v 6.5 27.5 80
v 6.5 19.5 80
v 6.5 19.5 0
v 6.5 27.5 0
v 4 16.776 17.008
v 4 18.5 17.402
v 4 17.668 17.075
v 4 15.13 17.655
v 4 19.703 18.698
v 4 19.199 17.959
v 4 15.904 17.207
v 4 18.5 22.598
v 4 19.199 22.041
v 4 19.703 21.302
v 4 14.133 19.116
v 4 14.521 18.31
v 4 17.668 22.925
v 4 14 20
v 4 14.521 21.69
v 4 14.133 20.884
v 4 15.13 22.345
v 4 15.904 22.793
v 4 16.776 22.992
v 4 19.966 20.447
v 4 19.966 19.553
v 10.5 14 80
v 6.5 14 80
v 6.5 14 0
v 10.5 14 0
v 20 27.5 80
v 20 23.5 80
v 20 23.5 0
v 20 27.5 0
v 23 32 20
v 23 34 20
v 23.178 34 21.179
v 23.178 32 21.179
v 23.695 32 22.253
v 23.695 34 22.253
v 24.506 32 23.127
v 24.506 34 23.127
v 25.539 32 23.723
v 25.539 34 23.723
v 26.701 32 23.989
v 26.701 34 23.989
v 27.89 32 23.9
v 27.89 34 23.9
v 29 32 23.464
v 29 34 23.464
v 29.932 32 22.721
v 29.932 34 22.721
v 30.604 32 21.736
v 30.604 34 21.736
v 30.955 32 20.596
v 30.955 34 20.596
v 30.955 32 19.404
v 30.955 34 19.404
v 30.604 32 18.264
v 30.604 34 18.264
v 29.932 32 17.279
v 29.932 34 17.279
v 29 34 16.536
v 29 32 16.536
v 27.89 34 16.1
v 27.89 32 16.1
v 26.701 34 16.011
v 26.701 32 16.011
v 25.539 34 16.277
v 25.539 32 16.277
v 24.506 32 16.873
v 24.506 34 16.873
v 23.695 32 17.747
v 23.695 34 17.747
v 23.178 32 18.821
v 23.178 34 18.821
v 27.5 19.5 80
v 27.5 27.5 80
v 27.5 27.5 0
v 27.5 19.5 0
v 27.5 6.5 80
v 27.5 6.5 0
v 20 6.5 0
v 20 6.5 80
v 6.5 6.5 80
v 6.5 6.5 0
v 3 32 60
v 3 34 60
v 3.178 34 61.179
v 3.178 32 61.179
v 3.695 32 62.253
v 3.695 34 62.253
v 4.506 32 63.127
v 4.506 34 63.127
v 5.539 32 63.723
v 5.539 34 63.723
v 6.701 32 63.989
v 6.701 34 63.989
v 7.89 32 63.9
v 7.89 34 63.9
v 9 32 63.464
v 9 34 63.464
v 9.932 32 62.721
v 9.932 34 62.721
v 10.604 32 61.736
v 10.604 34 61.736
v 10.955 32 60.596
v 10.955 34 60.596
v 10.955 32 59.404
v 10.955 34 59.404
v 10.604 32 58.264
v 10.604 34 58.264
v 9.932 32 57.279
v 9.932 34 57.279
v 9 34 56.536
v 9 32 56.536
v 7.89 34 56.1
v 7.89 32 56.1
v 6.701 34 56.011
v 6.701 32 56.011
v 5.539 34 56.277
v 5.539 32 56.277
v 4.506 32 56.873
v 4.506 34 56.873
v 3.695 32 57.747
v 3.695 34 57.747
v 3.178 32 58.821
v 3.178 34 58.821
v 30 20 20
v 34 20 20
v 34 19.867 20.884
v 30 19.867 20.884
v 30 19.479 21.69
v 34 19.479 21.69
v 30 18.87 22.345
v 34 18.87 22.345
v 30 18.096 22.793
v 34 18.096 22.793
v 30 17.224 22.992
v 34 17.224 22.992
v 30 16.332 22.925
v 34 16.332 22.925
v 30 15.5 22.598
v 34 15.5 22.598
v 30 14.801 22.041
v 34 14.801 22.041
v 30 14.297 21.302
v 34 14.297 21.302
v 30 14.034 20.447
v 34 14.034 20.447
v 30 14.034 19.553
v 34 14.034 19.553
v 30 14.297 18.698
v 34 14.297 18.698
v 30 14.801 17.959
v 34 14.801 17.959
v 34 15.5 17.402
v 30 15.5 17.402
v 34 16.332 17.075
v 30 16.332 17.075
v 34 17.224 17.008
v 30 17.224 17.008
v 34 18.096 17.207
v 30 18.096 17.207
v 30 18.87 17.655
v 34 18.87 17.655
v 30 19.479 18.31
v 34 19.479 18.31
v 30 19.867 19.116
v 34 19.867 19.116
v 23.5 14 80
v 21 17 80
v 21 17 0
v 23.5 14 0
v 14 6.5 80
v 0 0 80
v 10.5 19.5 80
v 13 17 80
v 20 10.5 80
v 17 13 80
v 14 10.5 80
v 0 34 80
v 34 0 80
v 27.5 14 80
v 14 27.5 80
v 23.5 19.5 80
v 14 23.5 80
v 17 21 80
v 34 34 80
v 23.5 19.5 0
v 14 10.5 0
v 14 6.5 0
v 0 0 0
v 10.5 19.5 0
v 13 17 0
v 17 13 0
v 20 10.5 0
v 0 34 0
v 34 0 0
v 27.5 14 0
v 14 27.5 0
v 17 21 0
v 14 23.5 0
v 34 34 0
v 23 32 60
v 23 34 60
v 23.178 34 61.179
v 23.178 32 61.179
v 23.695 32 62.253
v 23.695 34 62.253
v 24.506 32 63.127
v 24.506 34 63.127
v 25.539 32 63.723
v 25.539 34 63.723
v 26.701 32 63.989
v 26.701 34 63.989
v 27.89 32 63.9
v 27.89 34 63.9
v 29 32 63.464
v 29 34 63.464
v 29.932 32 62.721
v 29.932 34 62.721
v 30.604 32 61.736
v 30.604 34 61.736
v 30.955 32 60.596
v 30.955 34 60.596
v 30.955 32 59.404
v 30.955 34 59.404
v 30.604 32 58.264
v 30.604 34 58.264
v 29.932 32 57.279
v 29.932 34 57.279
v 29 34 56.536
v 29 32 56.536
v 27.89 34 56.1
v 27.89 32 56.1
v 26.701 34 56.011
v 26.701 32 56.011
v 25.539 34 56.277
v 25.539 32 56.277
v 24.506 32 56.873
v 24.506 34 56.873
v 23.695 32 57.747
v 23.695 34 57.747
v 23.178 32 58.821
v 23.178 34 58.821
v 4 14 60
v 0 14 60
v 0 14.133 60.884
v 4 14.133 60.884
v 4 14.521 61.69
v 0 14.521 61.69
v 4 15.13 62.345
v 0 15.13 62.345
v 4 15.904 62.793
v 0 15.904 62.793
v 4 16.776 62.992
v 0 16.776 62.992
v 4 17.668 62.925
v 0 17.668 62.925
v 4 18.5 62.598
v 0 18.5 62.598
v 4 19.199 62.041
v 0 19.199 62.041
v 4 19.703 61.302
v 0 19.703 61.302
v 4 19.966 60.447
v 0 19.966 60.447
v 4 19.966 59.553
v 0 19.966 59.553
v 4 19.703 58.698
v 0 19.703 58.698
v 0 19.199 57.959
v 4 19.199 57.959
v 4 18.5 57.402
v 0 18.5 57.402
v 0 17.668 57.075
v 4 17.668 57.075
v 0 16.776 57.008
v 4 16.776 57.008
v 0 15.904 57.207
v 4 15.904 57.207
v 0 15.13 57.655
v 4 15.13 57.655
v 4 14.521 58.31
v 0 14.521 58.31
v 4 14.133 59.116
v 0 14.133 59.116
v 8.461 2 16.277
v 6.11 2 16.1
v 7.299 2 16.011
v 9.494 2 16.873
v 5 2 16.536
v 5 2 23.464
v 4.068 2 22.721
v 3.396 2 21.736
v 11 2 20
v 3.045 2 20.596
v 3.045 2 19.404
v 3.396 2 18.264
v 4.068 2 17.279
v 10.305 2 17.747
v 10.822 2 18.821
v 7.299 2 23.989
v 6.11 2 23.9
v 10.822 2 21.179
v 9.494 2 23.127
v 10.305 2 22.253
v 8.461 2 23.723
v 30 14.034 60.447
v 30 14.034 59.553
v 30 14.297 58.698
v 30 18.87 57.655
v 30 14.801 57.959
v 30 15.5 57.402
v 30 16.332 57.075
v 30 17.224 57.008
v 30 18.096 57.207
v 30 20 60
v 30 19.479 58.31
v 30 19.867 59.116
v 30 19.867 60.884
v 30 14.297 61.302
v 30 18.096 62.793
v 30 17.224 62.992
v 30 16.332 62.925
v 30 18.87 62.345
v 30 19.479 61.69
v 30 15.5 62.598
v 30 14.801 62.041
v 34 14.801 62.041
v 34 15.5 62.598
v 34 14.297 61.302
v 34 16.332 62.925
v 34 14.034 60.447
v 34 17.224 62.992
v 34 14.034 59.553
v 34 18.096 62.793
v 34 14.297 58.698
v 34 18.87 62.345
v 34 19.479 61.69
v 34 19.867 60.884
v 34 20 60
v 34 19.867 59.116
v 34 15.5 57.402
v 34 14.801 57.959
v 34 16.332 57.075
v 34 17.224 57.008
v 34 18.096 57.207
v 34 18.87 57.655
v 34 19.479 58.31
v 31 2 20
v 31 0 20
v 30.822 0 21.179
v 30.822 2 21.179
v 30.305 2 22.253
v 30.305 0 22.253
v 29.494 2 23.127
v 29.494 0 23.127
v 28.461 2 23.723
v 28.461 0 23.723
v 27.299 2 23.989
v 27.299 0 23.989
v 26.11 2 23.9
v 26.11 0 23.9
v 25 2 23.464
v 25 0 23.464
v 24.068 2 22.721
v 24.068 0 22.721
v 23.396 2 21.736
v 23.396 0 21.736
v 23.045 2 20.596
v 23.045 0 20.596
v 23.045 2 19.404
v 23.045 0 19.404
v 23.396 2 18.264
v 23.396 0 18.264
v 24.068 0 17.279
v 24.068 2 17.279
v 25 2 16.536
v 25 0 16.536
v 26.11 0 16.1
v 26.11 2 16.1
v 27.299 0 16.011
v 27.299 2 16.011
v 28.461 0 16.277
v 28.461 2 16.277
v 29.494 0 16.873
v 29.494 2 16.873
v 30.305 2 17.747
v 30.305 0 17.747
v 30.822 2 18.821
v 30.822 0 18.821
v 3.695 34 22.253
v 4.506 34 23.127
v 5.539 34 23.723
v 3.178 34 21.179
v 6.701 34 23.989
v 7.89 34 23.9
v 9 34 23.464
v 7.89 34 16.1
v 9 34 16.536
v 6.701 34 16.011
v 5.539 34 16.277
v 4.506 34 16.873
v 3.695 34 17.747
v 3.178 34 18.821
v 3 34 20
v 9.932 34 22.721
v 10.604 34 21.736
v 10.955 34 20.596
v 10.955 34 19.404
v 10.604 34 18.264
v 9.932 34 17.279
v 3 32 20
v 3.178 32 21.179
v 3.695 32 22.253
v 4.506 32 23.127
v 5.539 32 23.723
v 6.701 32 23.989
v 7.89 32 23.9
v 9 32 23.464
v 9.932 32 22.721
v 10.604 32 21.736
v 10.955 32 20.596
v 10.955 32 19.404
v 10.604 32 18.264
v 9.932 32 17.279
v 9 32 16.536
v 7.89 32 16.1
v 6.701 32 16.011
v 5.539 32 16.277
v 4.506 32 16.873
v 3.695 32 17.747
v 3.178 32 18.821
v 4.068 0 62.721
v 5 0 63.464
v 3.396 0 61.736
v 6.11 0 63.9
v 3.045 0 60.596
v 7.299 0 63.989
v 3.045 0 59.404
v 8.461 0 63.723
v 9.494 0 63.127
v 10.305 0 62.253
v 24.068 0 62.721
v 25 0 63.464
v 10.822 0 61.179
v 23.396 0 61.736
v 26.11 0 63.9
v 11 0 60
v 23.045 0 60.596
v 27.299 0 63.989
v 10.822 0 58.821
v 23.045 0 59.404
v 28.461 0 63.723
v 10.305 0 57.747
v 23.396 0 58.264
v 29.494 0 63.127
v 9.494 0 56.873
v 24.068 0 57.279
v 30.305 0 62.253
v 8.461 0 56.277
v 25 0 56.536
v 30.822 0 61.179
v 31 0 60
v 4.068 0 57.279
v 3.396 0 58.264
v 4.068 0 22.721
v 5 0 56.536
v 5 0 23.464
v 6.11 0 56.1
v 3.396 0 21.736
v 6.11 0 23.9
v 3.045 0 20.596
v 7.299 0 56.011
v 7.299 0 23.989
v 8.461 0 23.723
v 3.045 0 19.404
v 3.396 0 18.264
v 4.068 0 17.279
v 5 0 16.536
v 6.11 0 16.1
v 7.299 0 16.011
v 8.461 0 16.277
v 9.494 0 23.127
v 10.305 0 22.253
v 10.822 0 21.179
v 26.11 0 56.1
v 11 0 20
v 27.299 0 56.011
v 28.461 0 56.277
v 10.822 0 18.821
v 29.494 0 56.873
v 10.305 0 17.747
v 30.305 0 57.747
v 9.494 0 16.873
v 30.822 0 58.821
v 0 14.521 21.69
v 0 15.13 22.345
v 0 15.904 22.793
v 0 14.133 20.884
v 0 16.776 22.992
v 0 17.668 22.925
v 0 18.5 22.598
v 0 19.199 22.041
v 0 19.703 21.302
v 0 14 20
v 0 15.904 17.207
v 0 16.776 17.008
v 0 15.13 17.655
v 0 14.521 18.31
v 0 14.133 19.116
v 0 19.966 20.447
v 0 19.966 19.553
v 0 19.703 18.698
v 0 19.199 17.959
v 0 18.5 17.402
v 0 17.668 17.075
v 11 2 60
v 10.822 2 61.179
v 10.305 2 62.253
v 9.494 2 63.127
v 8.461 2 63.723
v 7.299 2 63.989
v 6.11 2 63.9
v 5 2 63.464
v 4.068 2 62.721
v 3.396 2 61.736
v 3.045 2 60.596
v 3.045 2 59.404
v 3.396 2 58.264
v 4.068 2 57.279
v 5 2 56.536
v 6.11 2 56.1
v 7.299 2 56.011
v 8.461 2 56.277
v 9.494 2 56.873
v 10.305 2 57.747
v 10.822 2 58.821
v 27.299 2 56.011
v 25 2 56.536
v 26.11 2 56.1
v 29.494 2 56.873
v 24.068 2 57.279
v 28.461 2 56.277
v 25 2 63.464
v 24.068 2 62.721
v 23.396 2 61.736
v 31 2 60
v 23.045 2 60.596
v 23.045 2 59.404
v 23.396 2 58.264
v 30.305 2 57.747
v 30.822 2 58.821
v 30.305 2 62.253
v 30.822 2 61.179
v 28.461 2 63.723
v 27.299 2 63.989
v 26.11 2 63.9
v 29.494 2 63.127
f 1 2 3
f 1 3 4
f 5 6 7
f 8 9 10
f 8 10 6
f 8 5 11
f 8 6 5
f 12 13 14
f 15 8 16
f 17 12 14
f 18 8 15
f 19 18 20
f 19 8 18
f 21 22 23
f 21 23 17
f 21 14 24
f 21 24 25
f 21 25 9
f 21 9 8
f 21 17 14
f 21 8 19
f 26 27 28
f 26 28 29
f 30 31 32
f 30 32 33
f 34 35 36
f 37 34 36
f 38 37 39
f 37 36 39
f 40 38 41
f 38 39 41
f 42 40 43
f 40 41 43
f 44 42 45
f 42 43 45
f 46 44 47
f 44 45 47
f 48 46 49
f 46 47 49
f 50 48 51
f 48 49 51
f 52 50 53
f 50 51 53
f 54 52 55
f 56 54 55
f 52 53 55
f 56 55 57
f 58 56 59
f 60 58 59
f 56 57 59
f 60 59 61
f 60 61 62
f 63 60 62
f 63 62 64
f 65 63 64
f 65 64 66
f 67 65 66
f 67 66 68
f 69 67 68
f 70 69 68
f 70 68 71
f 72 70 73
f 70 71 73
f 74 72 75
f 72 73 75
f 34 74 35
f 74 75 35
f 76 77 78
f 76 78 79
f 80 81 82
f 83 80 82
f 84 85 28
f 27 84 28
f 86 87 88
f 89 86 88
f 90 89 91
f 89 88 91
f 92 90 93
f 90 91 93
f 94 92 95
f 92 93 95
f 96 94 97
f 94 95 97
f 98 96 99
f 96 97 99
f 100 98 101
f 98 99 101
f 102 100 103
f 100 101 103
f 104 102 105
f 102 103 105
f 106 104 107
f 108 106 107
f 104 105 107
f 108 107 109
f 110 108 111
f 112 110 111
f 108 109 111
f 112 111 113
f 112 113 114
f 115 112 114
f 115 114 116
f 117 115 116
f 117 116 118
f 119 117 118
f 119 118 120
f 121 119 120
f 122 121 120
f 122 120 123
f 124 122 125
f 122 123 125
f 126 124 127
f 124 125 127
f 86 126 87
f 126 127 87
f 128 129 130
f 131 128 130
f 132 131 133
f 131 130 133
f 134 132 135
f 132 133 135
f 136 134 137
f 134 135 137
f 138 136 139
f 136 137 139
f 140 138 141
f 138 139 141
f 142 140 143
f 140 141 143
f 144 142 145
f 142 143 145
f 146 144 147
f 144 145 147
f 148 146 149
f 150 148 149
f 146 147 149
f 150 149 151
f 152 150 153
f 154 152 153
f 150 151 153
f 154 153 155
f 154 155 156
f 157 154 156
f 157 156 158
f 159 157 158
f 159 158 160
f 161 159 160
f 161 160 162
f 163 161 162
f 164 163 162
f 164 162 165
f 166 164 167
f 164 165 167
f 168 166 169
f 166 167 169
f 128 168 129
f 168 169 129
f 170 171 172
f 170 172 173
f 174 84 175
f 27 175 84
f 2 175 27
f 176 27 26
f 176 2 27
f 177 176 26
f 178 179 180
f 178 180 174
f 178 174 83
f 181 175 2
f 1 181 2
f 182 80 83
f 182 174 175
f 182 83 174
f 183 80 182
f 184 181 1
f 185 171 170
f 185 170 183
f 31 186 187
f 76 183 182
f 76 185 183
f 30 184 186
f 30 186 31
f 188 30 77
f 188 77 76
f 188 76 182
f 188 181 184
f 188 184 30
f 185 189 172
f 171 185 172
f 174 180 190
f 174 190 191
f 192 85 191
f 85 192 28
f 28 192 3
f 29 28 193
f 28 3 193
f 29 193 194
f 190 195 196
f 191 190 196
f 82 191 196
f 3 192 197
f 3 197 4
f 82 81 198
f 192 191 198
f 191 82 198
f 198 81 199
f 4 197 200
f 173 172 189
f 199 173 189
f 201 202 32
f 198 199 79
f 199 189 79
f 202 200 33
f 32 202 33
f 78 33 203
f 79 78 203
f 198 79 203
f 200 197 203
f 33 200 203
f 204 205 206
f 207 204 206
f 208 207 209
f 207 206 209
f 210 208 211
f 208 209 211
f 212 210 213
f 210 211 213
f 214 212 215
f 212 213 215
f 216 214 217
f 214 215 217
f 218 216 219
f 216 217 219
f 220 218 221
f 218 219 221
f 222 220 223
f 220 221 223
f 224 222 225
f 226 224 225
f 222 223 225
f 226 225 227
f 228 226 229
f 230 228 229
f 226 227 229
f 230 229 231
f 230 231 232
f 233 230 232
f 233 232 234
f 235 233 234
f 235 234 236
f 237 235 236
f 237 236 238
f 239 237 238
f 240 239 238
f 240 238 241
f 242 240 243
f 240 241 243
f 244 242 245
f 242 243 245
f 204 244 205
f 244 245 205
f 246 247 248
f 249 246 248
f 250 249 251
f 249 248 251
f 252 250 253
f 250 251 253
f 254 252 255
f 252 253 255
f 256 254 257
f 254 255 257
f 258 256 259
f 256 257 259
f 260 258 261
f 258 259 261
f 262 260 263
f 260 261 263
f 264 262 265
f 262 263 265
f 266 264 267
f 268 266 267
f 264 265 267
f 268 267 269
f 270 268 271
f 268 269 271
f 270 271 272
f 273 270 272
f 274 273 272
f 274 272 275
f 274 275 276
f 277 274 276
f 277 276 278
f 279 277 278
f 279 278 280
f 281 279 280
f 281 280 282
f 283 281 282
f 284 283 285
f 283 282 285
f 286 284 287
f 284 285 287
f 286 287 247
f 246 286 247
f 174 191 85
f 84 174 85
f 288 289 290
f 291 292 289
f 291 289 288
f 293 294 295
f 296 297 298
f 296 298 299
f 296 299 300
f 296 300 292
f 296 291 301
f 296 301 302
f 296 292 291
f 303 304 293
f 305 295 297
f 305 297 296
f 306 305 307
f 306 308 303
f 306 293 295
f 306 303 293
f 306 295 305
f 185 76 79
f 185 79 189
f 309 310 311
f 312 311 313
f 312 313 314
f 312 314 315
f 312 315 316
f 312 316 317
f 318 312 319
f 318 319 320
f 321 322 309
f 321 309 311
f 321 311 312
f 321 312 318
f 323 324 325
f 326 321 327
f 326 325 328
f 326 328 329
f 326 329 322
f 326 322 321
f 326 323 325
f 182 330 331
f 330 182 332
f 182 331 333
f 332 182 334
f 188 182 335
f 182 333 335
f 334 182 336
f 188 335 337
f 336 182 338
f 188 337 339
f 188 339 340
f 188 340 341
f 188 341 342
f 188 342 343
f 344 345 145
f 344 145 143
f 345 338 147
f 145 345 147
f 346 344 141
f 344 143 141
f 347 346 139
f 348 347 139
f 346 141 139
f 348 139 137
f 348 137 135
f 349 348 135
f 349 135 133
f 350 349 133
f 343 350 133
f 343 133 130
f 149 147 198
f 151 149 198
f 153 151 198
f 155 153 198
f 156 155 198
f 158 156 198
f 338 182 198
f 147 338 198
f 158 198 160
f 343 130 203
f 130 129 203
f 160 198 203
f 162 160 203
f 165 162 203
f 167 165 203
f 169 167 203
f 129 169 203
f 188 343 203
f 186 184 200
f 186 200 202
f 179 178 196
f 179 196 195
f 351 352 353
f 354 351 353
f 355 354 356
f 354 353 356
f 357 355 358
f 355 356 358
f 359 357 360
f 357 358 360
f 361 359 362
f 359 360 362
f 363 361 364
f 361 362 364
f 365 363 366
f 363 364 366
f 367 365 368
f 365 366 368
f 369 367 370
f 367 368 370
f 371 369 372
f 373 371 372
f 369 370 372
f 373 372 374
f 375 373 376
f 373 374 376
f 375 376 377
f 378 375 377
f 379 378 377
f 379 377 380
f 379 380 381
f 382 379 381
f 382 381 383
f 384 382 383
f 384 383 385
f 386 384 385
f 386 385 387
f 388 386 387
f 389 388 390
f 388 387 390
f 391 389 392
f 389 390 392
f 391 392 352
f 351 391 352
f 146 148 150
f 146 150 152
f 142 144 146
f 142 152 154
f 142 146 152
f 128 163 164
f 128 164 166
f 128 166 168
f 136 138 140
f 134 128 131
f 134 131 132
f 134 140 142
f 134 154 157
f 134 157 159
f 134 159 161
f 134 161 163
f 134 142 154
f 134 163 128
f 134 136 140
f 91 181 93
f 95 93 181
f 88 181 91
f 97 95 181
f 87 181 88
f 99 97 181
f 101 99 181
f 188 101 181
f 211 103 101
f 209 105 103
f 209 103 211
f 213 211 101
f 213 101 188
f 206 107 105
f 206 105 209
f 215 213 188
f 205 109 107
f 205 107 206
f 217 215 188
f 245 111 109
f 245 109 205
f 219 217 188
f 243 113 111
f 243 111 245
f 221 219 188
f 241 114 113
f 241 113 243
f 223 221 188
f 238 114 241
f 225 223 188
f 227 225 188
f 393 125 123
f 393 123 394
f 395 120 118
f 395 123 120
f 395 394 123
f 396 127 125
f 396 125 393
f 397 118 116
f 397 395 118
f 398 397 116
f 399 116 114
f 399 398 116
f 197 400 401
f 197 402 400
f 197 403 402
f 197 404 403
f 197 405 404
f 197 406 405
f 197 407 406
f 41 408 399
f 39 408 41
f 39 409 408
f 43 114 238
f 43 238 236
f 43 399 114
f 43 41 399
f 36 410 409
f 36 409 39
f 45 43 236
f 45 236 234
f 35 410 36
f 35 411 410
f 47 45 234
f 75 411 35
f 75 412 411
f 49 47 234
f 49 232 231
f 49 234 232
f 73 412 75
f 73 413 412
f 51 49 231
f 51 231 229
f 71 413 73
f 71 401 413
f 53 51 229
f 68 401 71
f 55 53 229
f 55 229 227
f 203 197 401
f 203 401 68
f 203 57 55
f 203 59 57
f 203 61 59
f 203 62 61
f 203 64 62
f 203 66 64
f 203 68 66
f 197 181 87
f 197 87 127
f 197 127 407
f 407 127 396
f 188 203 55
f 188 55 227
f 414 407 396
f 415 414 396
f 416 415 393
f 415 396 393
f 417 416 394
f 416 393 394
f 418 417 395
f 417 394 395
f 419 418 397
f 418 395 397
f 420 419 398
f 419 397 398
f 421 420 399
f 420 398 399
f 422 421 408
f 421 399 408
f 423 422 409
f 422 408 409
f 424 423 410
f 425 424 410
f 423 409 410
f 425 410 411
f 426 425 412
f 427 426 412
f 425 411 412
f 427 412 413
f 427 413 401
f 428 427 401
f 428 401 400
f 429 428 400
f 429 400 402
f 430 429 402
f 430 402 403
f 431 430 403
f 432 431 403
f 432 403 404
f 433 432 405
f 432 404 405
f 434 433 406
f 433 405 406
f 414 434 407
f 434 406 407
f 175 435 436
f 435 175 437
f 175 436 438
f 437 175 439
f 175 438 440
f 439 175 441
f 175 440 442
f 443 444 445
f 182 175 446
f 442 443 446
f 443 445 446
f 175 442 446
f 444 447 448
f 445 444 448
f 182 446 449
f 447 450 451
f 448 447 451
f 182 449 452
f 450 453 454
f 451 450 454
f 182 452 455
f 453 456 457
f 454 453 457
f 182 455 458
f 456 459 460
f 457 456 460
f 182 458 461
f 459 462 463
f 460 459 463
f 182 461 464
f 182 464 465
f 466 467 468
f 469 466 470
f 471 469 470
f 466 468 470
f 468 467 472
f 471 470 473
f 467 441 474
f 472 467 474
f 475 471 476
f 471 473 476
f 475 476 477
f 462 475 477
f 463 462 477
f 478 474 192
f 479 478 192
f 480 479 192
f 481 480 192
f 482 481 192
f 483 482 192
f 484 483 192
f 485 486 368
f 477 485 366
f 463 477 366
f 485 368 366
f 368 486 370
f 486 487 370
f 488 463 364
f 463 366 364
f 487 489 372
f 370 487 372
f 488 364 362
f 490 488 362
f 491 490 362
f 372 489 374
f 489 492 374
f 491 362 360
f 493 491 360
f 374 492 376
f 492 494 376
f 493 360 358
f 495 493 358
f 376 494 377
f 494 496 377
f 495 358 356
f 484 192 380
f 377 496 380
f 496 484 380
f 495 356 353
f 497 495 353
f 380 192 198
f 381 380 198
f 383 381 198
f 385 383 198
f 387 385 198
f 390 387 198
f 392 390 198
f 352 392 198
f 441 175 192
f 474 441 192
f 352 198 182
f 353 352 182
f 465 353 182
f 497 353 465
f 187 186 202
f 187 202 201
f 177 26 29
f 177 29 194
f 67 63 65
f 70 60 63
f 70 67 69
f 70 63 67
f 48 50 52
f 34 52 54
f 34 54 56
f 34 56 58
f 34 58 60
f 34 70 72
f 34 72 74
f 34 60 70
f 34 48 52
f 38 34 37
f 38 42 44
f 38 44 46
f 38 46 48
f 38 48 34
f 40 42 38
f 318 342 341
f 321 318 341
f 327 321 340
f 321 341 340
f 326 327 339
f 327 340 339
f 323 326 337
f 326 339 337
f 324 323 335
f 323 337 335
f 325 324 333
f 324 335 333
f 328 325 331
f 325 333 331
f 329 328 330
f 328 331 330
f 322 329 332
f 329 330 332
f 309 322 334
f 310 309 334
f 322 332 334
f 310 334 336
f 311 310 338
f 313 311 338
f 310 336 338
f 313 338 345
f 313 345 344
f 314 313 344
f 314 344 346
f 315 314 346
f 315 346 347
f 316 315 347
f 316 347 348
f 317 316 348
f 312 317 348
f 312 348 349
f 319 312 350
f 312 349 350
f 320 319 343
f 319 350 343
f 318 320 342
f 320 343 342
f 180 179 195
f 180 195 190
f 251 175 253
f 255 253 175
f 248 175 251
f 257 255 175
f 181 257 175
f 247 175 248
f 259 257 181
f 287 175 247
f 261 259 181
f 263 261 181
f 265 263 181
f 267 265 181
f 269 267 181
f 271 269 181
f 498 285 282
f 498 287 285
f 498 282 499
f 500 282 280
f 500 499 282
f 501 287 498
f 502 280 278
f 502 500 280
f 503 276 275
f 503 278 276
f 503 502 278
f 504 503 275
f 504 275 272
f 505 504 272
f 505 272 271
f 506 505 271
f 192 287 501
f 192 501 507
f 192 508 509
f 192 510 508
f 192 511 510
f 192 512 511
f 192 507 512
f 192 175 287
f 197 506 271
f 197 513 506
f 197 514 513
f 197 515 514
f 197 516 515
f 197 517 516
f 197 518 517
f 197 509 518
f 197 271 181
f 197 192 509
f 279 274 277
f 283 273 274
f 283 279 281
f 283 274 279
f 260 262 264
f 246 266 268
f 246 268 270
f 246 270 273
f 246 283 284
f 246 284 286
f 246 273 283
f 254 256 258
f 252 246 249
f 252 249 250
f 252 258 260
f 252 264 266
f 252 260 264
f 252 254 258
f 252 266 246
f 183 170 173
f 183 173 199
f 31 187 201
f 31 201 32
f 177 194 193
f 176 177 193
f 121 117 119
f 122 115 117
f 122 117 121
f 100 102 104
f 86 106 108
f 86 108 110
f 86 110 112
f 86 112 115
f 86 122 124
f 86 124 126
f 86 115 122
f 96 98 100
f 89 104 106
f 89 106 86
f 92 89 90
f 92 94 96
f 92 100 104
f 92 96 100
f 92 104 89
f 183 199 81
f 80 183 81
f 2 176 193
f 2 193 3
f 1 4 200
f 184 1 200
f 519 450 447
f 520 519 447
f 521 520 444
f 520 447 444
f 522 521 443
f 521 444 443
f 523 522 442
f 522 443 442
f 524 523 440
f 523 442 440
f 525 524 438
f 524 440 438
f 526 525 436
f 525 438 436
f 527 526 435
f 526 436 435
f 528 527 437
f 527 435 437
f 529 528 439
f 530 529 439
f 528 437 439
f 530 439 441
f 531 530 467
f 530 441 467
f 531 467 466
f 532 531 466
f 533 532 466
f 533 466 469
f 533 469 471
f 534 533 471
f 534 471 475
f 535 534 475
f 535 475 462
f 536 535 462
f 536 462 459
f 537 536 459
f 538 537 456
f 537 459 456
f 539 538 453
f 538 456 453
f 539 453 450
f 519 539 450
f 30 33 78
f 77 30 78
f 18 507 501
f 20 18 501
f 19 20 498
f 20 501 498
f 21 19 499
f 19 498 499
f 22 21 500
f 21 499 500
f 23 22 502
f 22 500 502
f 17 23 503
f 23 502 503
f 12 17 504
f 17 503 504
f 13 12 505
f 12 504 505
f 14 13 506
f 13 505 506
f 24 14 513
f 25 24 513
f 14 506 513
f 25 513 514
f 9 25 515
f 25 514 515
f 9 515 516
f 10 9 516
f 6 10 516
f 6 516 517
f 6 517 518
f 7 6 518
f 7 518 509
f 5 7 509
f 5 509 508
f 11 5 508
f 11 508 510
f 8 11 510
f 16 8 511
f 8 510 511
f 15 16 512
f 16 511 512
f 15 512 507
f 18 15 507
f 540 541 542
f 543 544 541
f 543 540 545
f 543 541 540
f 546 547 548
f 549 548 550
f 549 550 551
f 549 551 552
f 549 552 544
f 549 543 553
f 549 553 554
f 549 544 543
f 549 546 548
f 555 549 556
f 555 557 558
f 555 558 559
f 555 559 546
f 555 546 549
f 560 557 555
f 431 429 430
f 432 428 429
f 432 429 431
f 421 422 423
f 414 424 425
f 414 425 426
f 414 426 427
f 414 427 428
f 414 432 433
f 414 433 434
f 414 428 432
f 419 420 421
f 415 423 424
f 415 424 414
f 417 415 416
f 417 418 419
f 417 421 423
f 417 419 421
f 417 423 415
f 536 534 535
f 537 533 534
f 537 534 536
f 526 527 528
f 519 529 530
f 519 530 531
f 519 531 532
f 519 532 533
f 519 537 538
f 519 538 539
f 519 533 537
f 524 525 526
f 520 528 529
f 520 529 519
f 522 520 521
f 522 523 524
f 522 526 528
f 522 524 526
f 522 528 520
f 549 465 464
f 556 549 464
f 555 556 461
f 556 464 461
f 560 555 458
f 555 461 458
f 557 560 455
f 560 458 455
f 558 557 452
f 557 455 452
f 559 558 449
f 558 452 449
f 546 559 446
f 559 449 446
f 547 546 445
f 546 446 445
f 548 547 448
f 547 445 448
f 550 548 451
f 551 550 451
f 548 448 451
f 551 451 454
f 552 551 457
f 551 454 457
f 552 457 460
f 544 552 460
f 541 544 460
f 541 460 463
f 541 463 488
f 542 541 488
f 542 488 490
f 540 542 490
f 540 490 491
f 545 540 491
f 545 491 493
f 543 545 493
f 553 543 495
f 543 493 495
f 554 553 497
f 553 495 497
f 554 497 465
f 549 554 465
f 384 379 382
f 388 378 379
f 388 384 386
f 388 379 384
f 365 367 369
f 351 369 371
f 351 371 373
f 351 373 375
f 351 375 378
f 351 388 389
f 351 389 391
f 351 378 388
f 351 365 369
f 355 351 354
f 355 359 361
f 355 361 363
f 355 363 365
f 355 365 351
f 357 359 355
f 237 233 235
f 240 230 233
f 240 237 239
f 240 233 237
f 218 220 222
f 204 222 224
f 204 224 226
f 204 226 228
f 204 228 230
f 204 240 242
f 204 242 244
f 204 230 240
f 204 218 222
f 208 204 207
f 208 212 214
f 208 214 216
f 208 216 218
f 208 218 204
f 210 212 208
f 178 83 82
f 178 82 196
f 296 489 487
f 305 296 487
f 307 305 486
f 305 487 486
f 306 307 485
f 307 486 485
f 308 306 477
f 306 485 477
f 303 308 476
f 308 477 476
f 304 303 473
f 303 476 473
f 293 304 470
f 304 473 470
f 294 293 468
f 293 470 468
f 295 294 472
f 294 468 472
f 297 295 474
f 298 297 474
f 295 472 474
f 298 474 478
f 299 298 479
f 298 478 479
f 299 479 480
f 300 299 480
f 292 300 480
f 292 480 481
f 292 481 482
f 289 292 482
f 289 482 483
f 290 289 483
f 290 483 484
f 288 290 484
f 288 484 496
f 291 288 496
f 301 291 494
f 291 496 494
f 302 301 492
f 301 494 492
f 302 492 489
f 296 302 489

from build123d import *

# Parameters (mm, degrees)
SKETCH_W        = 34
SKETCH_H        = 34
PAD_DEPTH       = 80
POCKET_DEPTH    = 80
SKETCH002_R     = 3
POCKET001_DEPTH = 4
SKETCH003_R     = 3
POCKET002_DEPTH = 4
SKETCH004_R     = 4
POCKET003_DEPTH = 2
SKETCH005_R     = 4
POCKET004_DEPTH = 2


with BuildPart() as part:
    # Sketch → Pad (new body)
    with BuildSketch(Plane.XY):
        with Locations((17, 17)):
            Rectangle(SKETCH_W, SKETCH_H)
    extrude(amount=PAD_DEPTH)

    # Sketch001 (on Face6 of Pad) → Pocket (cut)
    with BuildSketch(Plane.XY.offset(80)):
        Polygon((6.5, 27.5), (14, 27.5), (14, 23.5), (17, 21), (20, 23.5), (20, 27.5), (27.5, 27.5), (27.5, 19.5), (23.5, 19.5), (21, 17), (23.5, 14), (27.5, 14), (27.5, 6.5), (20, 6.5), (20, 10.5), (17, 13), (14, 10.5), (14, 6.5), (6.5, 6.5), (6.5, 14), (10.5, 14), (13, 17), (10.5, 19.5), (6.5, 19.5), align=None)
    extrude(amount=-POCKET_DEPTH, mode=Mode.SUBTRACT)

    # Sketch002 (on Face2 of Pocket) → Pocket001 (cut)
    with BuildSketch(Plane(origin=(0, 0, 0), x_dir=(0, -1, 0), z_dir=(-1, 0, 0))):
        with Locations((-17, 60)):
            Circle(SKETCH002_R)
        with Locations((-17, 20)):
            Circle(SKETCH002_R)
    extrude(amount=-POCKET001_DEPTH, mode=Mode.SUBTRACT)

    # Sketch003 (on Face3 of Pocket001) → Pocket002 (cut)
    with BuildSketch(Plane.YZ.offset(34)):
        with Locations((17, 60)):
            Circle(SKETCH003_R)
        with Locations((17, 20)):
            Circle(SKETCH003_R)
    extrude(amount=-POCKET002_DEPTH, mode=Mode.SUBTRACT)

    # Sketch004 (on Face1 of Pocket002) → Pocket003 (cut)
    with BuildSketch(Plane(origin=(0, 34, 0), x_dir=(-1, 0, 0), z_dir=(0, 1, 0))):
        with Locations((-27, 60)):
            Circle(SKETCH004_R)
        with Locations((-7, 60)):
            Circle(SKETCH004_R)
        with Locations((-27, 20)):
            Circle(SKETCH004_R)
        with Locations((-7, 20)):
            Circle(SKETCH004_R)
    extrude(amount=-POCKET003_DEPTH, mode=Mode.SUBTRACT)

    # Sketch005 (on Face10 of Pocket003) → Pocket004 (cut)
    with BuildSketch(Plane.XZ):
        with Locations((7, 60)):
            Circle(SKETCH005_R)
        with Locations((27, 60)):
            Circle(SKETCH005_R)
        with Locations((7, 20)):
            Circle(SKETCH005_R)
        with Locations((27, 20)):
            Circle(SKETCH005_R)
    extrude(amount=-POCKET004_DEPTH, mode=Mode.SUBTRACT)


solid = part.part
